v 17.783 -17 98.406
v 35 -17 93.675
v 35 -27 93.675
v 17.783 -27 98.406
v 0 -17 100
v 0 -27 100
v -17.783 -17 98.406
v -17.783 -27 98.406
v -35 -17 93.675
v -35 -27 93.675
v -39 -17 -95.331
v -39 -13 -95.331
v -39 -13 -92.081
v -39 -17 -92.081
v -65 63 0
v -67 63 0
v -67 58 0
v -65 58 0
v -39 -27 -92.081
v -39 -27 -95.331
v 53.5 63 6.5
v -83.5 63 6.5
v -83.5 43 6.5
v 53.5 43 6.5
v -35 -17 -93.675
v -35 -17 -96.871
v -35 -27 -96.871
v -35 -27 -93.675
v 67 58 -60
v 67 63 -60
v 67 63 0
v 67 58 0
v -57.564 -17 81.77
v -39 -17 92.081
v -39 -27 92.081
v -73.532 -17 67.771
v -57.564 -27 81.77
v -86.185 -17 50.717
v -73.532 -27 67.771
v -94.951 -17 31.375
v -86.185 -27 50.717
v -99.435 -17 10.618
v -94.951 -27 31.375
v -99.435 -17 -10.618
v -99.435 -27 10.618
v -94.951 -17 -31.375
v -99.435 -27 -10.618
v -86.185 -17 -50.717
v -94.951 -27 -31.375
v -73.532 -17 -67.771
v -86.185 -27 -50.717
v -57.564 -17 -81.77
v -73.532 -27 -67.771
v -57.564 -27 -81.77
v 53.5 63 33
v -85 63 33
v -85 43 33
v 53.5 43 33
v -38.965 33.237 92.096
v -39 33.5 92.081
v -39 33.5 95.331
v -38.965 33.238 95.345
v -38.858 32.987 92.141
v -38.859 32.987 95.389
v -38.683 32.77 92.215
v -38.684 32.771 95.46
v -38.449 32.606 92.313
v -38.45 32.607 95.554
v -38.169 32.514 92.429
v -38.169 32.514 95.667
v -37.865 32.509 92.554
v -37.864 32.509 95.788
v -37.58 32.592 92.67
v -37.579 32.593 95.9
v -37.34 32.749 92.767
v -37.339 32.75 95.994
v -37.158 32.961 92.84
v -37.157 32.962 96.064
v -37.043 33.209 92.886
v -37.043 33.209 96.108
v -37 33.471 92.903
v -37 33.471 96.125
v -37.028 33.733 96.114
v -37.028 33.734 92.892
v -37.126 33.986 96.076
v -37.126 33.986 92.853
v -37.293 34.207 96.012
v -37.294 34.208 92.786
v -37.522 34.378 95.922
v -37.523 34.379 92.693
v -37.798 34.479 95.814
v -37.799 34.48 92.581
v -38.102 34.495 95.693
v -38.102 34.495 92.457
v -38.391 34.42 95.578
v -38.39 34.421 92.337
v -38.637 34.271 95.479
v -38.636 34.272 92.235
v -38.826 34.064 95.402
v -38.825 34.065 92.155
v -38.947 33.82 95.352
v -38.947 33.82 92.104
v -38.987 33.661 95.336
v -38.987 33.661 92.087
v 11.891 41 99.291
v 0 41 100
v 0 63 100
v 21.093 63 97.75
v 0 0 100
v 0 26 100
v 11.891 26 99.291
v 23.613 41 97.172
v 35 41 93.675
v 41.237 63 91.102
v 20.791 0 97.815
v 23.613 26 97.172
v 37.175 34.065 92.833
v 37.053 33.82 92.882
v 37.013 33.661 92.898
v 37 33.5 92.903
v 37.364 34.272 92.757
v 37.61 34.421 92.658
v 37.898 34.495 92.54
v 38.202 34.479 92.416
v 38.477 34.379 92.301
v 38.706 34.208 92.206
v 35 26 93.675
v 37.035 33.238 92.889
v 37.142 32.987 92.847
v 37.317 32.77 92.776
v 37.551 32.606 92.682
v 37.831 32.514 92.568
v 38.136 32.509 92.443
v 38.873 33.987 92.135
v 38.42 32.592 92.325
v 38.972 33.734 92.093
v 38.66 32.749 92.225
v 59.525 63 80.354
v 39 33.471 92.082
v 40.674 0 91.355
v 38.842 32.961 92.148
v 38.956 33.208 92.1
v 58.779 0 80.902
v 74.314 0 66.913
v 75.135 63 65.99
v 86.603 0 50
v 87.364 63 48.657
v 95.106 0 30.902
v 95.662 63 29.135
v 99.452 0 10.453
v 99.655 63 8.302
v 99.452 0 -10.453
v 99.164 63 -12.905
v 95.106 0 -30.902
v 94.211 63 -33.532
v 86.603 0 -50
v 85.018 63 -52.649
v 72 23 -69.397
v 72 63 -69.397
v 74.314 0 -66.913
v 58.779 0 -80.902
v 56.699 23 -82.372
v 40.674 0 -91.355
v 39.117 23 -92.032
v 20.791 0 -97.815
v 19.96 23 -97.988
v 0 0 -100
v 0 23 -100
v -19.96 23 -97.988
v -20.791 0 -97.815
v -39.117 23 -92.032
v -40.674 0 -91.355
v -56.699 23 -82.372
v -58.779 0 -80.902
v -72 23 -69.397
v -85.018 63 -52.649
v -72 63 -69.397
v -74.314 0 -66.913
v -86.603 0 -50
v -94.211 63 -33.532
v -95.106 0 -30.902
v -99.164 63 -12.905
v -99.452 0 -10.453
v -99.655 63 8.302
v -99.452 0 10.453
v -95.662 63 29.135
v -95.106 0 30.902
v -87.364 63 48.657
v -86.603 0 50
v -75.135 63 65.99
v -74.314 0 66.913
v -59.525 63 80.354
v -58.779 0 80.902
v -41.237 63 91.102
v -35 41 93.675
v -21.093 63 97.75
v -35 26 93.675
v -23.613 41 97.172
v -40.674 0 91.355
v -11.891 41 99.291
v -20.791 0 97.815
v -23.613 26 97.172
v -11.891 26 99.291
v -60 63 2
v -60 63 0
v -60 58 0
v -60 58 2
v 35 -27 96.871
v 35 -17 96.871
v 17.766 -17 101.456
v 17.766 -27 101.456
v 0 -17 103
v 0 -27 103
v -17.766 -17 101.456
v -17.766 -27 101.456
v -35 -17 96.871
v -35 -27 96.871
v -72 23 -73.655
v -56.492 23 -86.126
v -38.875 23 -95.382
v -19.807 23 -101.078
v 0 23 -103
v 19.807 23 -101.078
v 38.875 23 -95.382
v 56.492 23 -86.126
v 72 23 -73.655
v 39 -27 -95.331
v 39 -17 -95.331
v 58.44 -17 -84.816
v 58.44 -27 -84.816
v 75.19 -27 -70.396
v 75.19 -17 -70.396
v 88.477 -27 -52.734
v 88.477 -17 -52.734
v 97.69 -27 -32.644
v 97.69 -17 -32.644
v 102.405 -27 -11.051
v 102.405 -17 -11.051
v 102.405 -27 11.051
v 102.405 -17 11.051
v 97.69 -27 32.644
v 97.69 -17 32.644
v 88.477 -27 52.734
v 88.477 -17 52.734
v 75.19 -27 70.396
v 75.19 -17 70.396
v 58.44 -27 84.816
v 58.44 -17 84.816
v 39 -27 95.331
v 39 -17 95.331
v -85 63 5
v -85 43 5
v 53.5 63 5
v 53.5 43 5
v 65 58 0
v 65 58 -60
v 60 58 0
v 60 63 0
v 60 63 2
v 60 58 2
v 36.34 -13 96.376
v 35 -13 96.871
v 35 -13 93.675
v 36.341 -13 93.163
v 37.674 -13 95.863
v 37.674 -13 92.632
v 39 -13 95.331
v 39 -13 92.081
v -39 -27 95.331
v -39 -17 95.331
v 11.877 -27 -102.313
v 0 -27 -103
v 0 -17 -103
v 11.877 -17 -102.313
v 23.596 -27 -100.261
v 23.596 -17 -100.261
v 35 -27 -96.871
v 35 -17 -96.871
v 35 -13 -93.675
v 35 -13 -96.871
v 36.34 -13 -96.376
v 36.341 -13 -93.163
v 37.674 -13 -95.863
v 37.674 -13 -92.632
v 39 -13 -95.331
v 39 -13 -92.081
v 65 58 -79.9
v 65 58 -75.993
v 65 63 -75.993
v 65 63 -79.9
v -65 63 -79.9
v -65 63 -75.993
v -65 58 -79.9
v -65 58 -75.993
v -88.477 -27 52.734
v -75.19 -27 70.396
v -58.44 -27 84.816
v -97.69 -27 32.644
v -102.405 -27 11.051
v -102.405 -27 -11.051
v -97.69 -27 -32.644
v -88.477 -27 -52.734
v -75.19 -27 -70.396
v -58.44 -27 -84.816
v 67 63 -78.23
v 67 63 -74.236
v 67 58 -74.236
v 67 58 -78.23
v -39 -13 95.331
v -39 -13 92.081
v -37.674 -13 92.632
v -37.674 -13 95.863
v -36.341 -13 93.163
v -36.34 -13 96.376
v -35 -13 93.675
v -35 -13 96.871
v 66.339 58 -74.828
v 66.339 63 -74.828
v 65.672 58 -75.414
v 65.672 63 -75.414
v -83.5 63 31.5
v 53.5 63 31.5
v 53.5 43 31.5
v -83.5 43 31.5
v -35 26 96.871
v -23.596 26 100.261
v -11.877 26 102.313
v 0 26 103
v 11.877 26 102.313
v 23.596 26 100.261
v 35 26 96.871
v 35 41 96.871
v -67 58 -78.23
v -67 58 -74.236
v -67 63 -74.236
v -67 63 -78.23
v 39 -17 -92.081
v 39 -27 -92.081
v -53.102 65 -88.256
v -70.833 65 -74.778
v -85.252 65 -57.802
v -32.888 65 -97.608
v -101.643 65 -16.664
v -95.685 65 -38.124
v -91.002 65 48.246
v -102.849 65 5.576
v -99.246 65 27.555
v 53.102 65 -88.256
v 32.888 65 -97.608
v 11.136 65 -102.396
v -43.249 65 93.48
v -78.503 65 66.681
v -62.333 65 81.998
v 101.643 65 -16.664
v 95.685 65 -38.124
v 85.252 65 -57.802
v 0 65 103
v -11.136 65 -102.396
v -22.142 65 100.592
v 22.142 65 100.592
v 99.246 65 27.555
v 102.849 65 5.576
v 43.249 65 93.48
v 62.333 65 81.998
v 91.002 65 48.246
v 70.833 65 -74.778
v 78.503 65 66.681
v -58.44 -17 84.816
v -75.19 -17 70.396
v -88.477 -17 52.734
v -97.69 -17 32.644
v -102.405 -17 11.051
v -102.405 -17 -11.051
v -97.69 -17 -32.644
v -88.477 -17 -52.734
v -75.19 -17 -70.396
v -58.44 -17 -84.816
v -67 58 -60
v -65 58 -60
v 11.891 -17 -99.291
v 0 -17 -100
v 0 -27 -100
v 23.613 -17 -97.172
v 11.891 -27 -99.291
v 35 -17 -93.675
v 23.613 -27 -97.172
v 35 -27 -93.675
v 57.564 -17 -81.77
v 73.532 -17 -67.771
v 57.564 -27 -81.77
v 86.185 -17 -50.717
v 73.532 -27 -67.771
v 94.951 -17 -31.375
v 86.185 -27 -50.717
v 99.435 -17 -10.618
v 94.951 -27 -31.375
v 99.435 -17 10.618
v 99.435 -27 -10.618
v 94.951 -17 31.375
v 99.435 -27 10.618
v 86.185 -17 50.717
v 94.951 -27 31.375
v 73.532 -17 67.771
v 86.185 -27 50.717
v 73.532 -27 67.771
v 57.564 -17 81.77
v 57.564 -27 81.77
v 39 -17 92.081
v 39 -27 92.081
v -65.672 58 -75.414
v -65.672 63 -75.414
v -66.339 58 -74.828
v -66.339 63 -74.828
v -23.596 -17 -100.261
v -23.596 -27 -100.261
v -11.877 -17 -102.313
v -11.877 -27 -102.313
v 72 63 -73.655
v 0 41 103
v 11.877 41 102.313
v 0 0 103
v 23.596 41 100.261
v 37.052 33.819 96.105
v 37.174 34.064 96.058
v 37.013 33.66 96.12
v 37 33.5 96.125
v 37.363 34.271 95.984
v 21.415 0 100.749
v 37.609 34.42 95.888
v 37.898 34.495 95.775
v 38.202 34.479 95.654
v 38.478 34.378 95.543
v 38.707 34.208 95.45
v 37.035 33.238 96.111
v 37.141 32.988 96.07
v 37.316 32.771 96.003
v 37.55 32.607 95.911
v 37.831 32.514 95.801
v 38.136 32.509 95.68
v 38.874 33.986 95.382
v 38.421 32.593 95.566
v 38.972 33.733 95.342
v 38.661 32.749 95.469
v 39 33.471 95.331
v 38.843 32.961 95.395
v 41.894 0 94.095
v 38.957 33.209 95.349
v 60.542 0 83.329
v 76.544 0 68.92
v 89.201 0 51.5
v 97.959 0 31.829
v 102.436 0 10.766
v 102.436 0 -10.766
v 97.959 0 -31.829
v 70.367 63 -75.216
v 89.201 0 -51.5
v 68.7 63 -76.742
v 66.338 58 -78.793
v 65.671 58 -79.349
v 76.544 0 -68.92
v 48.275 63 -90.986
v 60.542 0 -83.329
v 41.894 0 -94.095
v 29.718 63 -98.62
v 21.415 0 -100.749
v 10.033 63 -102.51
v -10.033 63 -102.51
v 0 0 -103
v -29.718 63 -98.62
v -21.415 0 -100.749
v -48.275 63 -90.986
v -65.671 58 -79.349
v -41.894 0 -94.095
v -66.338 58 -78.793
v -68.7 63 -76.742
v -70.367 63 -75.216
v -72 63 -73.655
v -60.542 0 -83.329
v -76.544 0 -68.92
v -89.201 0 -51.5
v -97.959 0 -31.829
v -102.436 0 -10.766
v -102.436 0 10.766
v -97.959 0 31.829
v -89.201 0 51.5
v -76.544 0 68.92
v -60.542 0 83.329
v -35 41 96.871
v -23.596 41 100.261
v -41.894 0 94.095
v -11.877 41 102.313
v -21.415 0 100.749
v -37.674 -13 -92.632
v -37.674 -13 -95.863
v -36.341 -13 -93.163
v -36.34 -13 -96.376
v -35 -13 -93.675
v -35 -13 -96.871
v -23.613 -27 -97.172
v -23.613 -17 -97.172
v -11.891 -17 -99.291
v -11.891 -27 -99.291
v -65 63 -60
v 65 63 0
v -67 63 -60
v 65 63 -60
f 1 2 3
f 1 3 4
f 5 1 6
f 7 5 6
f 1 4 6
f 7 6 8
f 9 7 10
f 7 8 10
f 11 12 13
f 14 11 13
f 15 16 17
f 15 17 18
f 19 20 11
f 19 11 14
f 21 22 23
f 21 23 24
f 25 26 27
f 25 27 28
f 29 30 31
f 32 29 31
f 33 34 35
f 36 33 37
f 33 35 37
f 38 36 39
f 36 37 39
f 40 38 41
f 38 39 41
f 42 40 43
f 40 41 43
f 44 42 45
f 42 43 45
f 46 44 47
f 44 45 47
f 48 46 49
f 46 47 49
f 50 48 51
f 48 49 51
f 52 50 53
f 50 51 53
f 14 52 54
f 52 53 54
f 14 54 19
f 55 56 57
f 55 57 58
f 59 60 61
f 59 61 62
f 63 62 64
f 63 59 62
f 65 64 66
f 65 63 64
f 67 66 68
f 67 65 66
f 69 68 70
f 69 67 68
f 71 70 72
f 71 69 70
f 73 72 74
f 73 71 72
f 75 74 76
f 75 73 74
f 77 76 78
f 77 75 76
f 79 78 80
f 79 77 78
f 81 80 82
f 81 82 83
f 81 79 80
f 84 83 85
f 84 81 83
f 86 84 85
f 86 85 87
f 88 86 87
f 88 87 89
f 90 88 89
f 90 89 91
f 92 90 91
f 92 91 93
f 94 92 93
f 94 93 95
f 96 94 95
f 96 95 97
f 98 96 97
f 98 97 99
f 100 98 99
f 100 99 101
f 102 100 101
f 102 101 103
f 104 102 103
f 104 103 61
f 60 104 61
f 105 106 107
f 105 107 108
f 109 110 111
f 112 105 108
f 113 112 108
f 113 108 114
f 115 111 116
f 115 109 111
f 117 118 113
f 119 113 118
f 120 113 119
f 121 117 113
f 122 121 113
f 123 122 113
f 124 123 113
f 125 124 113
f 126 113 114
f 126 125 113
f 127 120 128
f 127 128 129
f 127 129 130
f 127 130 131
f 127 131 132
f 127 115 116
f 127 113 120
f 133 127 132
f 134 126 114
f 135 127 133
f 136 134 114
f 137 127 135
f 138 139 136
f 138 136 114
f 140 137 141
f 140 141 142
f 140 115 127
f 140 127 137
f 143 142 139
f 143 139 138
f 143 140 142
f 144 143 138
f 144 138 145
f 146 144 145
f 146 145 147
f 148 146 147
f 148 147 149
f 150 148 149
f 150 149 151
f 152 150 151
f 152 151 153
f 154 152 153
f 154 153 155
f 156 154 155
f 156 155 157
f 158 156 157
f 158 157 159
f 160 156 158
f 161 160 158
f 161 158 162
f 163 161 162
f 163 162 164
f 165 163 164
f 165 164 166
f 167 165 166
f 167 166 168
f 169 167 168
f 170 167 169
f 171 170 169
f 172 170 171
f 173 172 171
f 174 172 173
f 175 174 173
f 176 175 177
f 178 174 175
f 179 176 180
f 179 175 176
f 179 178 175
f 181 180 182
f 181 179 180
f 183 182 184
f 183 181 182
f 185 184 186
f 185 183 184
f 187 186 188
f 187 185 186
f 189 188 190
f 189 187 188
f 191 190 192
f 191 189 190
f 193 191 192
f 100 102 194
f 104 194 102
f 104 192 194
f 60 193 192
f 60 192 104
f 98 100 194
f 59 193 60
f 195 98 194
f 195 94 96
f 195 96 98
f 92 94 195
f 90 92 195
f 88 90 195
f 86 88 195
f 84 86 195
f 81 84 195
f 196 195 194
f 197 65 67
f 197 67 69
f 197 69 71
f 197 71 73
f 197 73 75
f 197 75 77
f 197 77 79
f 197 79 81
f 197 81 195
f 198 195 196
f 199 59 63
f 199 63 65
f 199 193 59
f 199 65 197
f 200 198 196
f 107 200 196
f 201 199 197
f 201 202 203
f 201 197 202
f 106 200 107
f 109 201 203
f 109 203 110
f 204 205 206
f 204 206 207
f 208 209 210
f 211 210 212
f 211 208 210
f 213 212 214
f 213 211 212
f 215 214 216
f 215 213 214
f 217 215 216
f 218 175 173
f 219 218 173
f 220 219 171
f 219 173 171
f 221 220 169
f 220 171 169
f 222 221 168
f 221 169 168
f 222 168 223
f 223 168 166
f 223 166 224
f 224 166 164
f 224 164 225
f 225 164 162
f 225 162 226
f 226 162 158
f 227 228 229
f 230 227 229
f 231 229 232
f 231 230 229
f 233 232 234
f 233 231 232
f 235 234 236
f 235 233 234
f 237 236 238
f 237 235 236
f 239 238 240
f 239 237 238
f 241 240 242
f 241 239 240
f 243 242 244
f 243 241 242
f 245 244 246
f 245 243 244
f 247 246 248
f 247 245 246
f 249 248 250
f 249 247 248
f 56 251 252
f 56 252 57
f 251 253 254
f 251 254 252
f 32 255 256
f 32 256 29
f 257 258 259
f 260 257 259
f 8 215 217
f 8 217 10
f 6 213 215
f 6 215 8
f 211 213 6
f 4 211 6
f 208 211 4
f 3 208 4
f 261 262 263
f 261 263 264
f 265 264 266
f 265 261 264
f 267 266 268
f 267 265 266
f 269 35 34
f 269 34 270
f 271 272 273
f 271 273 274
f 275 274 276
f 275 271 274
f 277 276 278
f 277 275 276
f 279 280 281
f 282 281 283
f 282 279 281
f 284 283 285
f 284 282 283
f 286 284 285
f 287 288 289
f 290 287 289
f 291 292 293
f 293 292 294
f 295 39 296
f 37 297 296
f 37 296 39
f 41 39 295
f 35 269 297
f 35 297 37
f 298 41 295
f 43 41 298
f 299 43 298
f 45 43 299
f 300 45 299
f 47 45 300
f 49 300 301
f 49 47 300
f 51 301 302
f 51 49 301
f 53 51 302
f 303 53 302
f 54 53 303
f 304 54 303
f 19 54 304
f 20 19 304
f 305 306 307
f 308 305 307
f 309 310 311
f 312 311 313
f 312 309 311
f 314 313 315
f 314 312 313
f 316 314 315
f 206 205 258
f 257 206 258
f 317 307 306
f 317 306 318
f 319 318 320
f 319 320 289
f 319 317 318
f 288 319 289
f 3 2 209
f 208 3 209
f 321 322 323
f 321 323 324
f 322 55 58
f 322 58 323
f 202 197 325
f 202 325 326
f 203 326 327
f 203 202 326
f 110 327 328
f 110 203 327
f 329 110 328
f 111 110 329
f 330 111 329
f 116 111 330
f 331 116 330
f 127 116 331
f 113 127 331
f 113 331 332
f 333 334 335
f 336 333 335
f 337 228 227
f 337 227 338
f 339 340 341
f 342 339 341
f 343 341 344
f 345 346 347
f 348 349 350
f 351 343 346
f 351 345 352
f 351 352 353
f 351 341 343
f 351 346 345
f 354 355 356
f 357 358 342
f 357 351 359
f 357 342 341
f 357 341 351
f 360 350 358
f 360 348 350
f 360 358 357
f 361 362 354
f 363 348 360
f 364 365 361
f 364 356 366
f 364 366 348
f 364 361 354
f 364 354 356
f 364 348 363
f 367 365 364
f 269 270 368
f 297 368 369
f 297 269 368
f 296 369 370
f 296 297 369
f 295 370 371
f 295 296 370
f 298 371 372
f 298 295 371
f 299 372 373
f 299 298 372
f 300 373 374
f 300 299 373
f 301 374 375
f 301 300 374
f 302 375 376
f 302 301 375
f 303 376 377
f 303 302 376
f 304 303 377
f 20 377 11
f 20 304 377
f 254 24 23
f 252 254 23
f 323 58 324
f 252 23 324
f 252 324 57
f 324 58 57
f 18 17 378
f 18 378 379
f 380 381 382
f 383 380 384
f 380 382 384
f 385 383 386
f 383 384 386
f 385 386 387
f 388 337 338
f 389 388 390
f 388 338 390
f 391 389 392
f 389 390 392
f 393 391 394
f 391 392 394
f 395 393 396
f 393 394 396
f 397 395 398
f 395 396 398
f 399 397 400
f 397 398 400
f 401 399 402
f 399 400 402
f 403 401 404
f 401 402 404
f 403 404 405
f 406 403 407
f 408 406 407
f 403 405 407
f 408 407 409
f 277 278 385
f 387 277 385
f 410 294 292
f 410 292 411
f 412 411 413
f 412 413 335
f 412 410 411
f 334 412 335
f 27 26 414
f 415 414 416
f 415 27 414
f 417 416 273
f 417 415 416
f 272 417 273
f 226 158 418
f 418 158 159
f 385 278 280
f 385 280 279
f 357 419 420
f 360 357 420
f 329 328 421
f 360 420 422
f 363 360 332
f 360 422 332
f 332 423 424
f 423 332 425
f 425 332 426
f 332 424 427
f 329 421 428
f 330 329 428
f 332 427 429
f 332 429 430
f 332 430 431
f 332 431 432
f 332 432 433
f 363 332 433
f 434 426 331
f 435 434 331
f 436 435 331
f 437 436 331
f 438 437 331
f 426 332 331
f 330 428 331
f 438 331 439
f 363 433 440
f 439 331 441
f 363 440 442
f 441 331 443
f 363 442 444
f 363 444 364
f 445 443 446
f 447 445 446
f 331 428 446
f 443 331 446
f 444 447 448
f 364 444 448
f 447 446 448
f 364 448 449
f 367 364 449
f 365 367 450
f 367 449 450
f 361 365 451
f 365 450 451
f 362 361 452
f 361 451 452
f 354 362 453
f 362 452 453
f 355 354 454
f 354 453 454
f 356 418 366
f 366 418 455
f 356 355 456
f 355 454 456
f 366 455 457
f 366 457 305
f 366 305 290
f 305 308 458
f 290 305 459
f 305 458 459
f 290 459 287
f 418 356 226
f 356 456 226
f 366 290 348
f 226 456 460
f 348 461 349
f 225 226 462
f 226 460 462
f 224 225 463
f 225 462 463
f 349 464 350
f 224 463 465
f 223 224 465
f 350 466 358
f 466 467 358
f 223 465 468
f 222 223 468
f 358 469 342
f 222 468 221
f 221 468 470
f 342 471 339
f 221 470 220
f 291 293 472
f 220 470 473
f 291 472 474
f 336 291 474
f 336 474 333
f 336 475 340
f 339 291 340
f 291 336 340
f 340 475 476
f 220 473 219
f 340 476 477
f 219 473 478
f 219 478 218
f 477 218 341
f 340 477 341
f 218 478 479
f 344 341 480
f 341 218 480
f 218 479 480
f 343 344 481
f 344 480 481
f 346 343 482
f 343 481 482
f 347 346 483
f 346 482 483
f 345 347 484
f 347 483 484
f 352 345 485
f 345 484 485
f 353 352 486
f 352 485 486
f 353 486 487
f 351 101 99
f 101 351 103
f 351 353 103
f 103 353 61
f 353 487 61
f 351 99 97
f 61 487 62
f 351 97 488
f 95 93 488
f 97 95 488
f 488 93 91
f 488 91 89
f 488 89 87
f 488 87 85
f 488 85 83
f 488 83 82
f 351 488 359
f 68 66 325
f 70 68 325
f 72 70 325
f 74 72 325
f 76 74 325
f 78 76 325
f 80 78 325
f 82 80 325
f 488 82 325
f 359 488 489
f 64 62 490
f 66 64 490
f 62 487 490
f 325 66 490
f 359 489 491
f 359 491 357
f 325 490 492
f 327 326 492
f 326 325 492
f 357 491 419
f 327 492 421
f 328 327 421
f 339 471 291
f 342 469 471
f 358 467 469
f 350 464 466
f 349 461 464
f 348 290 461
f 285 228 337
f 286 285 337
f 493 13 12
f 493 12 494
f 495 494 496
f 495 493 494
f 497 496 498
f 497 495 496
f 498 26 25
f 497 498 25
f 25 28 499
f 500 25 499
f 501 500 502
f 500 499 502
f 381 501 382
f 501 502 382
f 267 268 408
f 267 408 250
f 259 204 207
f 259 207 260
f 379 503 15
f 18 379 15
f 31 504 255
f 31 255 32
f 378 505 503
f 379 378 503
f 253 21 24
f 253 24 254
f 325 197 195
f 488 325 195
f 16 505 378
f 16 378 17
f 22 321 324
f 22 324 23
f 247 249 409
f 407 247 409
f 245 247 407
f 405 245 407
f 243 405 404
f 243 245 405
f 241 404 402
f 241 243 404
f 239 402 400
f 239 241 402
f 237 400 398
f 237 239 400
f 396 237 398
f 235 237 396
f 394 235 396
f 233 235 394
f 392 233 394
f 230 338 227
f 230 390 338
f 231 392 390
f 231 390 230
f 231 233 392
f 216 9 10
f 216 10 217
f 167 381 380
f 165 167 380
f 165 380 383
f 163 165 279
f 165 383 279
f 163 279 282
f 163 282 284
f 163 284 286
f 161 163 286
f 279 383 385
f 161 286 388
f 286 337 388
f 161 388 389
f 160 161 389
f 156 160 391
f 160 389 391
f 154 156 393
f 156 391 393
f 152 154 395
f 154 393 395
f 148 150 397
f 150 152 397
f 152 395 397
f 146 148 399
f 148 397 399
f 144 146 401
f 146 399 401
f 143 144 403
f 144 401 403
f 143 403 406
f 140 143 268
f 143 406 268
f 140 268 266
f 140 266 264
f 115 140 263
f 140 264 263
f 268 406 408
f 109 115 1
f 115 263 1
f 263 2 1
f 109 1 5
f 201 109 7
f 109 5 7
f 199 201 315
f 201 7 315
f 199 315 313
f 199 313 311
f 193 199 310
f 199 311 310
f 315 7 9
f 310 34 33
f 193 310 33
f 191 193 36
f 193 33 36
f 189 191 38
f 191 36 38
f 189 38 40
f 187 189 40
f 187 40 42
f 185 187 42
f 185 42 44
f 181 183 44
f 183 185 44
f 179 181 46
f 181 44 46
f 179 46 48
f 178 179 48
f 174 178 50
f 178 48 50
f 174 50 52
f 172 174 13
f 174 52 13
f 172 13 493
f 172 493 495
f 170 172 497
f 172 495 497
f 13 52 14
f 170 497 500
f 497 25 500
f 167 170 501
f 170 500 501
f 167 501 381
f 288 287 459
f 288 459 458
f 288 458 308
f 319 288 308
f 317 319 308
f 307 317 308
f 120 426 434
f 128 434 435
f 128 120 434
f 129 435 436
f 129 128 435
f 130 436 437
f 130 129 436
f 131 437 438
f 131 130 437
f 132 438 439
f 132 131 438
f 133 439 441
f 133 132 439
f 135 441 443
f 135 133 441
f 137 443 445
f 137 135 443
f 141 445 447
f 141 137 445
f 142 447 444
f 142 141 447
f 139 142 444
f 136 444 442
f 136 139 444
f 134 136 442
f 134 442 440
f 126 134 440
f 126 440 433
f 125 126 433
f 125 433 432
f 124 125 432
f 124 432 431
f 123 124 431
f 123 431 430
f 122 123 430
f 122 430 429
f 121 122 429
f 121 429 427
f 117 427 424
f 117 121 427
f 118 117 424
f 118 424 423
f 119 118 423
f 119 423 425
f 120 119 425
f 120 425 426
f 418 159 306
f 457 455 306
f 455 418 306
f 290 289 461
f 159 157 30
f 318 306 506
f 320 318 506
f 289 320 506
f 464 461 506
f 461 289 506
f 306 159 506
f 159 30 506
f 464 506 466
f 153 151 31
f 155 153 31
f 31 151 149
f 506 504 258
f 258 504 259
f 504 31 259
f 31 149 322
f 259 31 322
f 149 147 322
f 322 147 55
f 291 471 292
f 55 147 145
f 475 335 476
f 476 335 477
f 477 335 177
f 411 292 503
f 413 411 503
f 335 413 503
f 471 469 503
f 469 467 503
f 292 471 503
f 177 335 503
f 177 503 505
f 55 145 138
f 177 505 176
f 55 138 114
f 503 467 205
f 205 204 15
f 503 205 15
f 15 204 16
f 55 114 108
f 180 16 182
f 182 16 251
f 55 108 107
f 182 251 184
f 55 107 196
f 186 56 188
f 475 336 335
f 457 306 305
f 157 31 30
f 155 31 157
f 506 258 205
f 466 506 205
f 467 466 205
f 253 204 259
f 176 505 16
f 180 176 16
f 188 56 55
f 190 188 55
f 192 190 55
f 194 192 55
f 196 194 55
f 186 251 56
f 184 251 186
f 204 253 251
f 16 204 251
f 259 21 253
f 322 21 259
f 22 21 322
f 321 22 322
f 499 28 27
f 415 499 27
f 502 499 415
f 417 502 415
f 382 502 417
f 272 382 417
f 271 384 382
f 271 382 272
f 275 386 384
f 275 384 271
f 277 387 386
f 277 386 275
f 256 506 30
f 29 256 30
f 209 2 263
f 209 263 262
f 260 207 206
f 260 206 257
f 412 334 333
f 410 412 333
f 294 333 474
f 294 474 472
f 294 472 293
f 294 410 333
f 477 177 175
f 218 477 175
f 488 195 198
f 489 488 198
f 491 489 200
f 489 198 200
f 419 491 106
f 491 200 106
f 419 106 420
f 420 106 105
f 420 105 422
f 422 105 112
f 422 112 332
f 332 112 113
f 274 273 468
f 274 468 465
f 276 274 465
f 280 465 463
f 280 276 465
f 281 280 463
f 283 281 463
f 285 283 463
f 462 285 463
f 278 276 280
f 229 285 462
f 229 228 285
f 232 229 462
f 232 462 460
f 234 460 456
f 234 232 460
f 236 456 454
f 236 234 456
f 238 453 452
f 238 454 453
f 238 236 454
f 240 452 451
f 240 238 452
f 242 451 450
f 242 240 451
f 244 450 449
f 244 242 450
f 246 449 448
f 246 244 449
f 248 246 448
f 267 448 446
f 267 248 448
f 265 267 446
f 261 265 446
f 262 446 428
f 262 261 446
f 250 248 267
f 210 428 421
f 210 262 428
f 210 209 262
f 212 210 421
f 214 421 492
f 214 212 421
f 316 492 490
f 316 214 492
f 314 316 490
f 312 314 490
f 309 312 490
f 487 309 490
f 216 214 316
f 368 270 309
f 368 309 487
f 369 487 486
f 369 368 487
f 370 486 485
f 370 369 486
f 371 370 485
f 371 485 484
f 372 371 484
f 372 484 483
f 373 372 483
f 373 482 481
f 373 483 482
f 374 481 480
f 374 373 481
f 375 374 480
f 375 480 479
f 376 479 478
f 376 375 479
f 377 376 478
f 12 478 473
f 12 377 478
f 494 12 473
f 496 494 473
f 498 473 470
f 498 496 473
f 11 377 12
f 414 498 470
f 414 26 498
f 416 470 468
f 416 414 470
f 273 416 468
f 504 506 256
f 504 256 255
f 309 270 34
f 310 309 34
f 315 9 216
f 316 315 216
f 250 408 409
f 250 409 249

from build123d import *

# Parameters (mm, degrees)
SKETCH_1_R               = 103
SKETCH_1_R_2             = 100
EXTRUDE_1_DEPTH          = 63
SKETCH_2_R               = 103
EXTRUDE_2_DEPTH          = 2
SKETCH_4_W               = 2
SKETCH_4_H               = 60
SKETCH_4_W_2             = 120
SKETCH_4_H_2             = 2
EXTRUDE_3_DEPTH          = 10
SKETCH_5_R               = 1
SKETCH_5_W               = 70
SKETCH_5_H               = 15
CUT_EXTRUDE_1_DEPTH      = 1000
EXTRUDE_4_DEPTH          = 20
CUT_EXTRUDE_2_DEPTH      = 150
SKETCH_10_W              = 120
SKETCH_10_H              = 2
SKETCH_10_W_2            = 2
SKETCH_10_H_2            = 60
CUT_EXTRUDE_3_DEPTH      = 5
SKETCH_11_W              = 3.150152901
SKETCH_11_H              = 6.664382079
SKETCH_11_W_2            = 3.458582199
SKETCH_11_H_2            = 6.22916057
CUT_EXTRUDE_4_DEPTH      = 5
EXTRUDE_START            = 17
SKETCH_13_R              = 103
SKETCH_13_R_2            = 100
EXTRUDE_5_DEPTH          = 17
SKETCH_15_W              = 4
SKETCH_15_H              = 4.789562653
CUT_EXTRUDE_5_DEPTH      = 4
CUT_EXTRUDE_6_DEPTH      = 15
CUT_EXTRUDE_6_DEPTH_BACK = 4
SKETCH_16_W              = 4
SKETCH_16_H              = 4.789562653
EXTRUDE_START_2          = 10
SKETCH_18_R              = 103
SKETCH_18_R_2            = 100
EXTRUDE_6_DEPTH          = 10
SKETCH_19_W              = 4
SKETCH_19_H              = 4.789562653
CUT_EXTRUDE_7_DEPTH      = 10


with BuildPart() as part:
    # 草图1 → 凸台-拉伸1 (new body)
    with BuildSketch(Plane(origin=(0, 0, 0), x_dir=(1, 0, 0), z_dir=(0, 1, 0))):
        with Locations(Location((0, 0, 0), (0, 0, 270))):
            Circle(SKETCH_1_R)
        with Locations(Location((0, 0, 0), (0, 0, 270))):
            Circle(SKETCH_1_R_2, mode=Mode.SUBTRACT)
    extrude(amount=EXTRUDE_1_DEPTH)

    # 草图2 → 凸台-拉伸2 (add)
    with BuildSketch(Plane(origin=(0, 63, 0), x_dir=(1, 0, 0), z_dir=(0, 1, 0))):
        with Locations(Location((0, 0, 0), (0, 0, 270))):
            Circle(SKETCH_2_R)
    extrude(amount=EXTRUDE_2_DEPTH)

    # 草图4 → 凸台-拉伸3 (add)
    with BuildSketch(Plane.XZ.offset(-63)):
        with Locations((-66, -30)):
            Rectangle(SKETCH_4_W, SKETCH_4_H)
        with Locations((66, -30)):
            Rectangle(SKETCH_4_W, SKETCH_4_H)
        with Locations((0, 1)):
            Rectangle(SKETCH_4_W_2, SKETCH_4_H_2)
    extrude(amount=EXTRUDE_3_DEPTH)

    # 草图5 → 切除-拉伸1 (cut)
    with BuildSketch(Plane.XY.offset(2)):
        with Locations(Location((-38, 33.5, 0), (0, 0, 180))):
            Circle(SKETCH_5_R)
        with Locations(Location((38, 33.5, 0), (0, 0, 180))):
            Circle(SKETCH_5_R)
        with Locations((0, 33.5)):
            Rectangle(SKETCH_5_W, SKETCH_5_H)
    extrude(amount=CUT_EXTRUDE_1_DEPTH, mode=Mode.SUBTRACT)

    # 草图6 → 凸台-拉伸4 (add)
    with BuildSketch(Plane.XZ.offset(-63)):
        Polygon((-85, 5), (-85, 33), (53.5, 33), (53.5, 31.5), (-83.5, 31.5), (-83.5, 6.5), (53.5, 6.5), (53.5, 5), align=None)
    extrude(amount=EXTRUDE_4_DEPTH)

    # 草图7 → 切除-拉伸2 (cut)
    with BuildSketch(Plane(origin=(0, 0, 0), x_dir=(-1, 0, 0), z_dir=(0, 0, -1))):
        Polygon((-72, 63), (-67, 63), (-67, 53), (-65, 53), (-65, 63), (65, 63), (65, 53), (67, 53), (67, 63), (72, 63), (72, 23), (-72, 23), align=None)
    extrude(amount=CUT_EXTRUDE_2_DEPTH, mode=Mode.SUBTRACT)

    # 草图10 → 切除-拉伸3 (cut)
    with BuildSketch(Plane.XZ.offset(-53)):
        with Locations((0, 1)):
            Rectangle(SKETCH_10_W, SKETCH_10_H)
        with Locations((-66, -30)):
            Rectangle(SKETCH_10_W_2, SKETCH_10_H_2)
        with Locations((66, -30)):
            Rectangle(SKETCH_10_W_2, SKETCH_10_H_2)
    extrude(amount=-CUT_EXTRUDE_3_DEPTH, mode=Mode.SUBTRACT)

    # 草图11 → 切除-拉伸4 (cut)
    with BuildSketch(Plane.XZ.offset(-53)):
        with Locations((-66.11313156, -76.941337865)):
            Rectangle(SKETCH_11_W, SKETCH_11_H)
        with Locations((65.709980809, -77.158948619)):
            Rectangle(SKETCH_11_W_2, SKETCH_11_H_2)
    extrude(amount=-CUT_EXTRUDE_4_DEPTH, mode=Mode.SUBTRACT)

    # 草图13 → 凸台-拉伸5 (add)
    with BuildSketch(Plane.XZ.offset(EXTRUDE_START)):
        with Locations(Location((0, 0, 0), (0, 0, 270))):
            Circle(SKETCH_13_R)
        with Locations(Location((0, 0, 0), (0, 0, 270))):
            Circle(SKETCH_13_R_2, mode=Mode.SUBTRACT)
    extrude(amount=-EXTRUDE_5_DEPTH)

    # 草图15 → 切除-拉伸5 (cut)
    with BuildSketch(Plane.XZ.offset(17)):
        Polygon((-39, 95.331002303), (-39, 92.081485653), (-35, 92.081485653), (-35, 100), (-39, 100), align=None)
        with Locations((37, 94.476266979)):
            Rectangle(SKETCH_15_W, SKETCH_15_H)
    extrude(amount=-CUT_EXTRUDE_5_DEPTH, mode=Mode.SUBTRACT)

    # 草图16 → 切除-拉伸6 (cut, two sides: drawn at the far end of the back side and taken through both)
    with BuildSketch(Plane.XZ.offset(17).offset(-CUT_EXTRUDE_6_DEPTH_BACK)):
        with Locations((37, -94.476266979)):
            Rectangle(SKETCH_16_W, SKETCH_16_H)
        with Locations((-37, -94.476266979)):
            Rectangle(SKETCH_16_W, SKETCH_16_H)
    extrude(amount=CUT_EXTRUDE_6_DEPTH + CUT_EXTRUDE_6_DEPTH_BACK, mode=Mode.SUBTRACT)

    # 草图18 → 凸台-拉伸6 (add)
    with BuildSketch(Plane.XZ.offset(17).offset(EXTRUDE_START_2)):
        with Locations(Location((0, 0, 0), (0, 0, 270))):
            Circle(SKETCH_18_R)
        with Locations(Location((0, 0, 0), (0, 0, 270))):
            Circle(SKETCH_18_R_2, mode=Mode.SUBTRACT)
    extrude(amount=-EXTRUDE_6_DEPTH)

    # 草图19 → 切除-拉伸7 (cut)
    with BuildSketch(Plane.XZ.offset(27)):
        with Locations((-37, -94.476266979)):
            Rectangle(SKETCH_19_W, SKETCH_19_H)
        with Locations((37, -94.476266979)):
            Rectangle(SKETCH_19_W, SKETCH_19_H)
        with Locations((-37, 94.476266979)):
            Rectangle(SKETCH_19_W, SKETCH_19_H)
        with Locations((37, 94.476266979)):
            Rectangle(SKETCH_19_W, SKETCH_19_H)
    extrude(amount=-CUT_EXTRUDE_7_DEPTH, mode=Mode.SUBTRACT)


solid = part.part
